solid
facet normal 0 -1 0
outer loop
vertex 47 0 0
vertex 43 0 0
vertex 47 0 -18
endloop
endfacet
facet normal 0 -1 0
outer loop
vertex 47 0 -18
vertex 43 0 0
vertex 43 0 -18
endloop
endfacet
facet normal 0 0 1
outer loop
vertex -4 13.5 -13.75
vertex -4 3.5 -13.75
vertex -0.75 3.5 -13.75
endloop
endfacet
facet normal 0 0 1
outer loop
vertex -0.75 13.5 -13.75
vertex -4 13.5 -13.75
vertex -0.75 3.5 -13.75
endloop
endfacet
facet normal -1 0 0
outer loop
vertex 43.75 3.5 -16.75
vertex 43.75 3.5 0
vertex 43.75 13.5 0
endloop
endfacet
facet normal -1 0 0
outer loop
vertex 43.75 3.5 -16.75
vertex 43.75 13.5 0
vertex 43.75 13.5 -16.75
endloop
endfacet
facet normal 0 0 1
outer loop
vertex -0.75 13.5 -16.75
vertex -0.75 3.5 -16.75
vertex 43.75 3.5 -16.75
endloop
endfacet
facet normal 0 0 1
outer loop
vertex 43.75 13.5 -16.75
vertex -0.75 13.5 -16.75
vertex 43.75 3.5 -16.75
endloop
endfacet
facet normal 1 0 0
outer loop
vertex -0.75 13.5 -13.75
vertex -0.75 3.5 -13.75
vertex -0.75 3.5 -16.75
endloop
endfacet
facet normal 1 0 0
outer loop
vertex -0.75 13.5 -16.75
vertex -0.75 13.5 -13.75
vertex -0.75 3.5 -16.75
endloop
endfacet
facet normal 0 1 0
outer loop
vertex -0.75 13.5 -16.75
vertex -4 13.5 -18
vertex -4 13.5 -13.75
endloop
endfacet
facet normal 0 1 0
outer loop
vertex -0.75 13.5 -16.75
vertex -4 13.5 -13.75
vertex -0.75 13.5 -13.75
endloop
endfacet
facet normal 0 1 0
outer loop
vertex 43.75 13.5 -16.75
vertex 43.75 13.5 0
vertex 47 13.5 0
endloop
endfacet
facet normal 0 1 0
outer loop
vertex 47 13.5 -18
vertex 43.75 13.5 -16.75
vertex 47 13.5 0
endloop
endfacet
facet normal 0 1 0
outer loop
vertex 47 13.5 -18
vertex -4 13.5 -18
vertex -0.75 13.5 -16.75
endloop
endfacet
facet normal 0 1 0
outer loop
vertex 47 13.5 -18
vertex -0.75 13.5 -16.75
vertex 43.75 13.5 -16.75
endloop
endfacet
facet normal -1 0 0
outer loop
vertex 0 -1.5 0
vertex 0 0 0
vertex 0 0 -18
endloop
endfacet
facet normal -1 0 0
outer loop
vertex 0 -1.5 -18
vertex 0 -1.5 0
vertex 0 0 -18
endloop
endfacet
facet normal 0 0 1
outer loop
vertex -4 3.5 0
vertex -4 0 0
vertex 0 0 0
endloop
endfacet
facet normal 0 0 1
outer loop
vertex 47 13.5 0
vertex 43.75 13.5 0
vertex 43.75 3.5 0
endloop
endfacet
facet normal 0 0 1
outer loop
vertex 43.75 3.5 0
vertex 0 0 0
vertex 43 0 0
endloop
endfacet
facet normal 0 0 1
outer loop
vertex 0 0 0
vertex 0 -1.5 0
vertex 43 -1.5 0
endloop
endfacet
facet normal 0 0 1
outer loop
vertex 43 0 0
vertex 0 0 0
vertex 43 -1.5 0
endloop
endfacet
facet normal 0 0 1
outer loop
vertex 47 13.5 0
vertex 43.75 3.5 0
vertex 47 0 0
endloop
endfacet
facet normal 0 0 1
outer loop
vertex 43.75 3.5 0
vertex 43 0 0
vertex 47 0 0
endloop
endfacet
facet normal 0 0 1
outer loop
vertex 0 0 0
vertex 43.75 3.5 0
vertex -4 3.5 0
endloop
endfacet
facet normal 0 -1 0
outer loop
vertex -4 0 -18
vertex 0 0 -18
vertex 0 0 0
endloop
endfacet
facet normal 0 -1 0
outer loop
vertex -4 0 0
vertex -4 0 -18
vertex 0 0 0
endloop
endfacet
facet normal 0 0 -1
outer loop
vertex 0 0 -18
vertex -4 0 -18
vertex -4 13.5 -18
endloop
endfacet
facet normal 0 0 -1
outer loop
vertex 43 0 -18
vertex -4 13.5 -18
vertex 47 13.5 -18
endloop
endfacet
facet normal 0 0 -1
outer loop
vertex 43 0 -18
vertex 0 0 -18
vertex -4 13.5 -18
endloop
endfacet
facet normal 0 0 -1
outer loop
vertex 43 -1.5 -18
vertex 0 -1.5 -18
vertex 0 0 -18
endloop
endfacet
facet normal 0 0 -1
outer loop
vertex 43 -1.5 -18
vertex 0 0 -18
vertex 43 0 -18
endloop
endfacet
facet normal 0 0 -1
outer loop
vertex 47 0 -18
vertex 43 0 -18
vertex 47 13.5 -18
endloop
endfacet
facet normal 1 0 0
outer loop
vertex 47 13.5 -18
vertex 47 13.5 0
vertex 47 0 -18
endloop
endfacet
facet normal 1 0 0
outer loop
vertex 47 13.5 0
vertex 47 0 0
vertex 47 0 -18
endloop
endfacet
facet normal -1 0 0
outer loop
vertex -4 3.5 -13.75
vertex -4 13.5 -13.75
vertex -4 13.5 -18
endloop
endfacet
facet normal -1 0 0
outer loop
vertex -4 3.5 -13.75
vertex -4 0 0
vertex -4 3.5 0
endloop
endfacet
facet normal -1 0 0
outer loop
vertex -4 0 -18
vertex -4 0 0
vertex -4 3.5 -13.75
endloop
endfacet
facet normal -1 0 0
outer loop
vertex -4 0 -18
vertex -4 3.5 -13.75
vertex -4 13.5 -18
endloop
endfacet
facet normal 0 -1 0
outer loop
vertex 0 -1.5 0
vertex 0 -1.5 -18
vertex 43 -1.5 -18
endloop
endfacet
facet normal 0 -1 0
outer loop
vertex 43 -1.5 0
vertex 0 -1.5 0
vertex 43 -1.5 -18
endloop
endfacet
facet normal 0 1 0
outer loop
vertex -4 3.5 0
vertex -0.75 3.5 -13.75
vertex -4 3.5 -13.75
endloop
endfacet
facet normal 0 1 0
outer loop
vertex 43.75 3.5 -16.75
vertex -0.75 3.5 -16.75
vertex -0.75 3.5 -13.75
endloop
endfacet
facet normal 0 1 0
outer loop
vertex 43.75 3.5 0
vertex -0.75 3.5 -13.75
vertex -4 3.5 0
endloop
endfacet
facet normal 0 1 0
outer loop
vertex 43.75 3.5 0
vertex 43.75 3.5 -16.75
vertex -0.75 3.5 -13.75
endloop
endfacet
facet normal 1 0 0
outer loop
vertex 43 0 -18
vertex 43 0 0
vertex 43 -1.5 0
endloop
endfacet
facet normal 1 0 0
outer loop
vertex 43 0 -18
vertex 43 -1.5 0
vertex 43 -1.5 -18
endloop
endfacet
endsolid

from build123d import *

# Parameters (mm, degrees)
ESQUISSE2_W             = 43
ESQUISSE2_H             = 18
BOSS_EXTRU_1_DEPTH      = 3.5
BOSS_EXTRU_1_DEPTH_BACK = 1.5
ESQUISSE3_W             = 18
ESQUISSE3_H             = 3.5
BOSS_EXTRU_2_DEPTH      = 4
ESQUISSE4_W             = 18
ESQUISSE4_H             = 3.5
BOSS_EXTRU_3_DEPTH      = 4
ESQUISSE5_W             = 51
ESQUISSE5_H             = 1.25
BOSS_EXTRU_4_DEPTH      = 10
ESQUISSE6_W             = 3.25
ESQUISSE6_H             = 16.75
BOSS_EXTRU_5_DEPTH      = 10
ESQUISSE7_W             = 3.25
ESQUISSE7_H             = 3
BOSS_EXTRU_6_DEPTH      = 10


with BuildPart() as part:
    # Esquisse2 → Boss.-Extru.1 (new body, two sides)
    with BuildSketch(Plane(origin=(0, 0, 0), x_dir=(1, 0, 0), z_dir=(0, 1, 0))) as boss_extru_1_sk:
        with Locations((21.5, 9)):
            Rectangle(ESQUISSE2_W, ESQUISSE2_H)
    extrude(amount=BOSS_EXTRU_1_DEPTH)
    extrude(boss_extru_1_sk.sketch, amount=-BOSS_EXTRU_1_DEPTH_BACK)

    # Esquisse3 → Boss.-Extru.2 (add)
    with BuildSketch(Plane(origin=(43, 0, 0), x_dir=(0, 0, -1), z_dir=(1, 0, 0))):
        with Locations((9, 1.75)):
            Rectangle(ESQUISSE3_W, ESQUISSE3_H)
    extrude(amount=BOSS_EXTRU_2_DEPTH)

    # Esquisse4 → Boss.-Extru.3 (add)
    with BuildSketch(Plane.ZY):
        with Locations((-9, 1.75)):
            Rectangle(ESQUISSE4_W, ESQUISSE4_H)
    extrude(amount=BOSS_EXTRU_3_DEPTH)

    # Esquisse5 → Boss.-Extru.4 (add)
    with BuildSketch(Plane(origin=(0, 3.5, 0), x_dir=(1, 0, 0), z_dir=(0, 1, 0))):
        with Locations((21.5, 17.375)):
            Rectangle(ESQUISSE5_W, ESQUISSE5_H)
    extrude(amount=BOSS_EXTRU_4_DEPTH)

    # Esquisse6 → Boss.-Extru.5 (add)
    with BuildSketch(Plane(origin=(0, 3.5, 0), x_dir=(1, 0, 0), z_dir=(0, 1, 0))):
        with Locations((45.375, 8.375)):
            Rectangle(ESQUISSE6_W, ESQUISSE6_H)
    extrude(amount=BOSS_EXTRU_5_DEPTH)

    # Esquisse7 → Boss.-Extru.6 (add)
    with BuildSketch(Plane(origin=(0, 3.5, 0), x_dir=(1, 0, 0), z_dir=(0, 1, 0))):
        with Locations((-2.375, 15.25)):
            Rectangle(ESQUISSE7_W, ESQUISSE7_H)
    extrude(amount=BOSS_EXTRU_6_DEPTH)


solid = part.part
